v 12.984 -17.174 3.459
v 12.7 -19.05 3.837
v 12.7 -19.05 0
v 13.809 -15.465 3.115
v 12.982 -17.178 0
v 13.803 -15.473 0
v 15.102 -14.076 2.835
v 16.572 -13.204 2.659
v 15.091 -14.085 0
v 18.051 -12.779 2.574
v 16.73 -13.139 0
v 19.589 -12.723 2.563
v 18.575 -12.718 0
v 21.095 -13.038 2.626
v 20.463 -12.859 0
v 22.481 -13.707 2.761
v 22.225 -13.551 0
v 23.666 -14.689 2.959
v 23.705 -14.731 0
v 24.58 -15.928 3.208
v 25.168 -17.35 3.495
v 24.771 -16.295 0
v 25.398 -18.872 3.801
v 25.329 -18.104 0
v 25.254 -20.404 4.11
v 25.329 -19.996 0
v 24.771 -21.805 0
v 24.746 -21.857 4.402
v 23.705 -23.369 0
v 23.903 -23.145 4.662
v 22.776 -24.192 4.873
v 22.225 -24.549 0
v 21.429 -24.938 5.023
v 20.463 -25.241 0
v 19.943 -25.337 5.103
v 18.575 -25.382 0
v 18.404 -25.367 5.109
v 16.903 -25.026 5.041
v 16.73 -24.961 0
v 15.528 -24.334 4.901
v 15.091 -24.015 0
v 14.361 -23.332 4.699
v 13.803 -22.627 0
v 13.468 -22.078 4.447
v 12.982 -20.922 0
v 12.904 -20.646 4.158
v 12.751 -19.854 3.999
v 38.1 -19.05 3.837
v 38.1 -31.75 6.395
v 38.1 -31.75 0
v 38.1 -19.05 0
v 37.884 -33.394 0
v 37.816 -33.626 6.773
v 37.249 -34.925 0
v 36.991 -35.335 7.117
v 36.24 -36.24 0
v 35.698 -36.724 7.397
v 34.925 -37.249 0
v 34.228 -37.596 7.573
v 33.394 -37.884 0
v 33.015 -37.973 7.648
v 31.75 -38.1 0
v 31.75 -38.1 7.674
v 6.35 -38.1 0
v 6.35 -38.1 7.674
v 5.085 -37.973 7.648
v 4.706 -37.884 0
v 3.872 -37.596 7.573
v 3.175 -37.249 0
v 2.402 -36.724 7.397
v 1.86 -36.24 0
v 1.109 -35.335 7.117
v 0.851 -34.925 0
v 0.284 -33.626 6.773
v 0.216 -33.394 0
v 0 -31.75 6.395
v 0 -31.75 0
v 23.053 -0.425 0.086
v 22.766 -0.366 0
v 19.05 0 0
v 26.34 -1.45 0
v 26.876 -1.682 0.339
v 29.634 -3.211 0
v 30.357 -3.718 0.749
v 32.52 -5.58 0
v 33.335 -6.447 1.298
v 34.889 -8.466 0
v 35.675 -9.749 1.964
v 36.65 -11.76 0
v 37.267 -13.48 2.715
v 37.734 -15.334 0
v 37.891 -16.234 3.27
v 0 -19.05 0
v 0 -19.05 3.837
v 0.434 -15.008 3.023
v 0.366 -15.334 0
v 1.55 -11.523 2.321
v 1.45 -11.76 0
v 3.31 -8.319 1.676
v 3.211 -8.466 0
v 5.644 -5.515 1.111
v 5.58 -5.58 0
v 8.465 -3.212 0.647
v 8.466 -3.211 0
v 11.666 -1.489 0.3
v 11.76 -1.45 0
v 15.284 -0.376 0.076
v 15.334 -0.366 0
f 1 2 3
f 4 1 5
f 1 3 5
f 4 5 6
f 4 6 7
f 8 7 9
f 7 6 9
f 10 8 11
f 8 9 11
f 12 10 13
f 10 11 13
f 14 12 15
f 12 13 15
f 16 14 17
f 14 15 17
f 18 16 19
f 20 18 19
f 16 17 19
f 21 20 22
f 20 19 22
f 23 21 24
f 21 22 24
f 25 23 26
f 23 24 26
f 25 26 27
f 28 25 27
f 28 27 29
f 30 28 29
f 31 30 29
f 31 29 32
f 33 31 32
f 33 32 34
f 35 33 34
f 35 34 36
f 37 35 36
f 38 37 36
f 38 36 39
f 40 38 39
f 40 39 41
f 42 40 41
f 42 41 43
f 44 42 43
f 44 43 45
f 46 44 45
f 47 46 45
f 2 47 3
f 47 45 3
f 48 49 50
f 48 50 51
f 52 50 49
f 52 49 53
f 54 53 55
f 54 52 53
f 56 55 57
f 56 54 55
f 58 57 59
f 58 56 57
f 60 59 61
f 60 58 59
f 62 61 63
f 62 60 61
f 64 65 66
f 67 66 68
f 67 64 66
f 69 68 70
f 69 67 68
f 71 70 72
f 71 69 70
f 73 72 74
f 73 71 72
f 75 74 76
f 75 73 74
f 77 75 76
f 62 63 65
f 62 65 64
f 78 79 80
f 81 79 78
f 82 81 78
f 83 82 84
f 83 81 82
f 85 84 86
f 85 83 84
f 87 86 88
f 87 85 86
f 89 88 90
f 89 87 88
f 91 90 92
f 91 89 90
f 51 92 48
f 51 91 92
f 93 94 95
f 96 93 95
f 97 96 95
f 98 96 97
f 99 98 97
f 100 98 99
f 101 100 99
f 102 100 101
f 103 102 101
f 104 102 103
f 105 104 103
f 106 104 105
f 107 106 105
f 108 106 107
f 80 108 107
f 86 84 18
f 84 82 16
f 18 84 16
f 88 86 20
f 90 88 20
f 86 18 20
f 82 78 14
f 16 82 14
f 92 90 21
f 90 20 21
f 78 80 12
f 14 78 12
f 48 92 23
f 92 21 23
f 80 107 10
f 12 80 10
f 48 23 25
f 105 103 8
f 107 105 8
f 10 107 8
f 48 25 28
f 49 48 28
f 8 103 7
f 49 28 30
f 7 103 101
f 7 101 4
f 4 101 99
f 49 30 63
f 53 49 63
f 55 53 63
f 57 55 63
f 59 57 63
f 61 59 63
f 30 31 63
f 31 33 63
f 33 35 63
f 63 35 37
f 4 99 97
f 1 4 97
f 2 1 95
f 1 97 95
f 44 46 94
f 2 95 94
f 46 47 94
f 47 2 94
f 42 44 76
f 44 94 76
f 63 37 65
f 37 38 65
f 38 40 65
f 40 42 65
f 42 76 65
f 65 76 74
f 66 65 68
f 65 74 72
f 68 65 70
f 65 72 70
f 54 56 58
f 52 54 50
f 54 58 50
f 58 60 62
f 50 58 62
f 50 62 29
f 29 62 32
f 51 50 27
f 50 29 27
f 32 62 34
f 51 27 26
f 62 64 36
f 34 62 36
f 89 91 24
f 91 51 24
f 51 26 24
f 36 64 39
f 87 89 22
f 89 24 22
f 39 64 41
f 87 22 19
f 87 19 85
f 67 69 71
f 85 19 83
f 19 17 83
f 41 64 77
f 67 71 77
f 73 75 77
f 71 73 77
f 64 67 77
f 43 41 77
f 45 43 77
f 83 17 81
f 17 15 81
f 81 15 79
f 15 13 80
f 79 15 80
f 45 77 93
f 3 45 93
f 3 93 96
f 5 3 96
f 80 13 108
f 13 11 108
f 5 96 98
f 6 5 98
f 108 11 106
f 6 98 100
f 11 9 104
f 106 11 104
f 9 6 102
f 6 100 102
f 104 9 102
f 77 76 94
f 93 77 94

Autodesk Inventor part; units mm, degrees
ref_plane "YZ Plane" through (0, 0, 0) normal (1, 0, 0) x (0, 1, 0)
ref_plane "XZ Plane" through (0, 0, 0) normal (0, 1, 0) x (-1, 0, 0)
ref_plane "XY Plane" through (0, 0, 0) normal (0, 0, 1) x (1, 0, 0)
sketch "Sketch1" plane through (0, 0, 0) normal (1, 0, 0) x (0, 1, 0)
  line L0 (0, 0) -> (-38.1, 7.674)
  line L1 (-38.1, 7.674) -> (-38.1, 0)
  line L2 (-38.1, 0) -> (0, 0)
  dimension "d0" = 38.1
  dimension "d1" = 11.388
extrude "Extrusion1" add sketch "Sketch1" along normal blind 38.1
sketch "Sketch2" plane through (0, -38.1, 0) normal (0, 0, -1) x (-1, 0, 0)
  circle A0 centre (-19.05, 19.05) radius 19.05
  line L0 (0, 38.1) -> (-38.1, 38.1) projected
  line L1 (0, 0) -> (0, 38.1) projected
  line L2 (-38.1, 0) -> (-38.1, 38.1) projected
  circle A1 centre (-19.05, 19.05) radius 6.35
  point P0 (-38.1, 19.05)
  point P1 (-19.05, 38.1)
  point P2 (0, 19.05)
  dimension "d4" = 12.7
extrude "Extrusion2" cut sketch "Sketch2" against normal through all contours A0 L0 L1 | A0 L2 L0 | A1
fillet "Fillet1" radius 6.35 2 edges at (38.1, -38.1, 3.837) (0, -38.1, 3.837)
properties part number "TRI_SPACER_TOP_TREBUCHET" material "Wood (Birch)"
